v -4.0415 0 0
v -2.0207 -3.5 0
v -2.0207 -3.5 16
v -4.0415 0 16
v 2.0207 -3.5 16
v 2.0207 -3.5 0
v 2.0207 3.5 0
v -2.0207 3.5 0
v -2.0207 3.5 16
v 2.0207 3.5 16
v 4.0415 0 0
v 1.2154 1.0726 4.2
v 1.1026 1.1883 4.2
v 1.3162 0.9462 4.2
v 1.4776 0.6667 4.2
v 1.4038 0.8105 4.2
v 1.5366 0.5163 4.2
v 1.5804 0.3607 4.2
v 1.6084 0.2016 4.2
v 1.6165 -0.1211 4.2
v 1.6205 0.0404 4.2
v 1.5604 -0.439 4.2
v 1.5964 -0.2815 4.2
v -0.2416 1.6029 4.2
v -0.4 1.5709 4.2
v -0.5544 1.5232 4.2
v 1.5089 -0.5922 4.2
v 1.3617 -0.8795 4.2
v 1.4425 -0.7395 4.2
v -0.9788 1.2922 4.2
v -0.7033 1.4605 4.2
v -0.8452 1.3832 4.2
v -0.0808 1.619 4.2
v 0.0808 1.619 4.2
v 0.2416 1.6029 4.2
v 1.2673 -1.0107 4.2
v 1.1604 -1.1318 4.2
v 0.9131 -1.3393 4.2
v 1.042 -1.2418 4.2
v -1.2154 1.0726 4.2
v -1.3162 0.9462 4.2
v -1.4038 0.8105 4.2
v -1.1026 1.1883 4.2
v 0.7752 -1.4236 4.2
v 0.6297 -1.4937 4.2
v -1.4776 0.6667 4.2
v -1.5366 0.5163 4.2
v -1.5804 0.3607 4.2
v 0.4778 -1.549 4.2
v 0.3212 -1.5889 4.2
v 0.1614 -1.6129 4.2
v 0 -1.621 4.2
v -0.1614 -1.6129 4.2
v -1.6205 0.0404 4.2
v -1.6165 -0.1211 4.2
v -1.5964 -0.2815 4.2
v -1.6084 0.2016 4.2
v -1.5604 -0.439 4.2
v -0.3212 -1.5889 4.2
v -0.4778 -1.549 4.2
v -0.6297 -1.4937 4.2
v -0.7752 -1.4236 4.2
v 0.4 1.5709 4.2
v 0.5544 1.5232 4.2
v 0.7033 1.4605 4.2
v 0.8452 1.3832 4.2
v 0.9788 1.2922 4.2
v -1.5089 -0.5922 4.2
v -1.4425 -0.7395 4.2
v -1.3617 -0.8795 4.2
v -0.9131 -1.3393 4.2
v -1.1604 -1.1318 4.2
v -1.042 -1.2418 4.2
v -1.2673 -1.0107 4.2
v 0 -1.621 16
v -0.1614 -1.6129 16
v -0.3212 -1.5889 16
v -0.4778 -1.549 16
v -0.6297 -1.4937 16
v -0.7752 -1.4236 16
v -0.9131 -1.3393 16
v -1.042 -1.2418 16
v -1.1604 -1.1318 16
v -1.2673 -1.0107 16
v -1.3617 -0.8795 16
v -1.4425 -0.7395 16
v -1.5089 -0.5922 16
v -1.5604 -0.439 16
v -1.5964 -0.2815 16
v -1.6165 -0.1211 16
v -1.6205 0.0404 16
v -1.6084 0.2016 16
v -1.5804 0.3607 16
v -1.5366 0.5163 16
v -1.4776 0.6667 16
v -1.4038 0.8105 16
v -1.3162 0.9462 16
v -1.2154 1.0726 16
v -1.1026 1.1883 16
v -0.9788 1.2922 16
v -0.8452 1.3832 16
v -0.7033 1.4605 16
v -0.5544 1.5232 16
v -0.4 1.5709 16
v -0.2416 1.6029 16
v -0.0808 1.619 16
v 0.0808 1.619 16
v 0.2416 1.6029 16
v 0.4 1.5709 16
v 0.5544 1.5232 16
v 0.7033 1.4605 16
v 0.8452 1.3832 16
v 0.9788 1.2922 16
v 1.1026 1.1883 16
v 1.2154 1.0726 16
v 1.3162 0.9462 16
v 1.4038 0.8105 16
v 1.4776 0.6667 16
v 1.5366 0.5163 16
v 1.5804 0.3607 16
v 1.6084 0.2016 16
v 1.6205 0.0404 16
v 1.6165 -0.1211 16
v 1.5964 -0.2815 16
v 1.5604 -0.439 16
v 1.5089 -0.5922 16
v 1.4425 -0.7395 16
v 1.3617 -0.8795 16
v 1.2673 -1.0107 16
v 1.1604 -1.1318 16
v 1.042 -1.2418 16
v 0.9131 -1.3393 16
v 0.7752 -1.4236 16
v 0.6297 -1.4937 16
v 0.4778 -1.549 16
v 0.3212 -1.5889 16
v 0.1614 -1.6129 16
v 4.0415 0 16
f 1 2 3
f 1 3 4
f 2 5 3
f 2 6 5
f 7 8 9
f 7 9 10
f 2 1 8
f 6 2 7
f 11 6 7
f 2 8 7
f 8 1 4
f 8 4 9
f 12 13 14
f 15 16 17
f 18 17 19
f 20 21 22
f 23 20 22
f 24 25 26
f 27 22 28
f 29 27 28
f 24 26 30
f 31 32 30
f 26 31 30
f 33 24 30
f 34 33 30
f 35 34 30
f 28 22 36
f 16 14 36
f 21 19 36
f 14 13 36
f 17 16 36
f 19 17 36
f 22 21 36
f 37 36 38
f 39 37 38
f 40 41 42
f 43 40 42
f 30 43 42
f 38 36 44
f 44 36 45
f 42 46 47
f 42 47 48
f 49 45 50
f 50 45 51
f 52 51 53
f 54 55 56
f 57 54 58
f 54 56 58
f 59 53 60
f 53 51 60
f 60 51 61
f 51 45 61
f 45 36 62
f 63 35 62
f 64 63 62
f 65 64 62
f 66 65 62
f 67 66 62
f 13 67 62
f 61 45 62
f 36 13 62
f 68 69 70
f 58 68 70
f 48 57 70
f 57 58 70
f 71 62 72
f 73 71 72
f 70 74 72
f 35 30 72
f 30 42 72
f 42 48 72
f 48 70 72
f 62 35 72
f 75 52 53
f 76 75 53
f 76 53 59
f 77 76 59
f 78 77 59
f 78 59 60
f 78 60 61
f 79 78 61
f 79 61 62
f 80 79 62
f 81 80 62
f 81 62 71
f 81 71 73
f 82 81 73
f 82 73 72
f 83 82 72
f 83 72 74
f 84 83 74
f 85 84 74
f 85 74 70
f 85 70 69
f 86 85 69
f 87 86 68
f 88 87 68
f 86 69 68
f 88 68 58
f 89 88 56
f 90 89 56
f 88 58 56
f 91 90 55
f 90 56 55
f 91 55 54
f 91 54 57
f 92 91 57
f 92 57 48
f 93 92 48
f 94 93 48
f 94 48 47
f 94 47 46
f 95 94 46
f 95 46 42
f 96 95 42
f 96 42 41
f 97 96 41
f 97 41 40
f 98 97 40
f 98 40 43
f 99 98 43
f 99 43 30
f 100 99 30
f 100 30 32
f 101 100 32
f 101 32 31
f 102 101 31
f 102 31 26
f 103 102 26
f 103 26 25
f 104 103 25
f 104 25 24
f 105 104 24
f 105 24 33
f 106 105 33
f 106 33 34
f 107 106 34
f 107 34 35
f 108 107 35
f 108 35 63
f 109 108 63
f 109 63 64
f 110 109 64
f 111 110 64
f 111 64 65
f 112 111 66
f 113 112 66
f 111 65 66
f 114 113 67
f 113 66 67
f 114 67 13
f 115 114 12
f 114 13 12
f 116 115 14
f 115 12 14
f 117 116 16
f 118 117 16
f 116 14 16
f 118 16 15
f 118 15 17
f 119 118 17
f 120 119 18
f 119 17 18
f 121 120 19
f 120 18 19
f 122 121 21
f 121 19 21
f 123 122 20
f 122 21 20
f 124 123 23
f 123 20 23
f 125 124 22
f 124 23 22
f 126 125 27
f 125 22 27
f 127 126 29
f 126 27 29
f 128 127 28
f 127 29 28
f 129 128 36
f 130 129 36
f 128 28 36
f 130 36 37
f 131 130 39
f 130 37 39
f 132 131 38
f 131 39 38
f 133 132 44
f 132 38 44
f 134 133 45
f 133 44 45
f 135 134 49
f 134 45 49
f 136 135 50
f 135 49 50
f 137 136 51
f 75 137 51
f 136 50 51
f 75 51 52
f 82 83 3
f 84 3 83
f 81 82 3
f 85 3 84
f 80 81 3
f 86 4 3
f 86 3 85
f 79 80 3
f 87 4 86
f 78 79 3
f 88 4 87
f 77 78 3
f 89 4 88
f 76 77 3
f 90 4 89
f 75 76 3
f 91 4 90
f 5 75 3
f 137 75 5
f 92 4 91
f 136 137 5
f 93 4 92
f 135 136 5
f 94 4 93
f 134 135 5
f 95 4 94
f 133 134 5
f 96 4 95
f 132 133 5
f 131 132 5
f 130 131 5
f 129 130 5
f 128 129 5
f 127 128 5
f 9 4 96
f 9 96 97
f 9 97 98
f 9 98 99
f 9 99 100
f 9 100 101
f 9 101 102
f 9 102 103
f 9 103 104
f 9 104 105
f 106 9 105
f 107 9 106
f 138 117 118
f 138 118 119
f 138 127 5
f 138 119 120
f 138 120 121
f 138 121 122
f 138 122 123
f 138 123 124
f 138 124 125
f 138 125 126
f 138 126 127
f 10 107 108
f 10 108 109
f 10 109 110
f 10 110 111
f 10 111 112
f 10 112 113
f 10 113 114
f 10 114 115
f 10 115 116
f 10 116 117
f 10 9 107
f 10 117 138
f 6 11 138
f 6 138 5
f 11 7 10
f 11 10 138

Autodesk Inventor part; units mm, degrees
ref_plane "YZ Plane" through (0, 0, 0) normal (1, 0, 0) x (0, 1, 0)
ref_plane "XZ Plane" through (0, 0, 0) normal (0, 1, 0) x (-1, 0, 0)
ref_plane "XY Plane" through (0, 0, 0) normal (0, 0, 1) x (1, 0, 0)
sketch "Sketch1" plane through (0, 0, 0) normal (0, 0, 1) x (1, 0, 0)
  line L0 (4.0415, 0) -> (2.0207, -3.5)
  line L1 (2.0207, -3.5) -> (-2.0207, -3.5)
  line L2 (-2.0207, -3.5) -> (-4.0415, 0)
  line L3 (-4.0415, 0) -> (-2.0207, 3.5)
  line L4 (-2.0207, 3.5) -> (2.0207, 3.5)
  line L5 (2.0207, 3.5) -> (4.0415, 0)
  point P0 (0, 0)
  point P1 (0, 0)
  dimension "d0" = 7
extrude "Extrusion1" add sketch "Sketch1" along normal blind 16
sketch "Sketch2" plane through (0, 0, 16) normal (0, 0, 1) x (1, 0, 0)
  point P0 (0, 0)
  point P1 (0, 0)
hole "Hole1" at (0, 0, 16) direction (0, 0, -1) diameter 3.242 depth 11.8 thread size "M4x0.7" class "6H" standard "ISO Metric profile"
properties part number "magneet stand-offs16 mm"
